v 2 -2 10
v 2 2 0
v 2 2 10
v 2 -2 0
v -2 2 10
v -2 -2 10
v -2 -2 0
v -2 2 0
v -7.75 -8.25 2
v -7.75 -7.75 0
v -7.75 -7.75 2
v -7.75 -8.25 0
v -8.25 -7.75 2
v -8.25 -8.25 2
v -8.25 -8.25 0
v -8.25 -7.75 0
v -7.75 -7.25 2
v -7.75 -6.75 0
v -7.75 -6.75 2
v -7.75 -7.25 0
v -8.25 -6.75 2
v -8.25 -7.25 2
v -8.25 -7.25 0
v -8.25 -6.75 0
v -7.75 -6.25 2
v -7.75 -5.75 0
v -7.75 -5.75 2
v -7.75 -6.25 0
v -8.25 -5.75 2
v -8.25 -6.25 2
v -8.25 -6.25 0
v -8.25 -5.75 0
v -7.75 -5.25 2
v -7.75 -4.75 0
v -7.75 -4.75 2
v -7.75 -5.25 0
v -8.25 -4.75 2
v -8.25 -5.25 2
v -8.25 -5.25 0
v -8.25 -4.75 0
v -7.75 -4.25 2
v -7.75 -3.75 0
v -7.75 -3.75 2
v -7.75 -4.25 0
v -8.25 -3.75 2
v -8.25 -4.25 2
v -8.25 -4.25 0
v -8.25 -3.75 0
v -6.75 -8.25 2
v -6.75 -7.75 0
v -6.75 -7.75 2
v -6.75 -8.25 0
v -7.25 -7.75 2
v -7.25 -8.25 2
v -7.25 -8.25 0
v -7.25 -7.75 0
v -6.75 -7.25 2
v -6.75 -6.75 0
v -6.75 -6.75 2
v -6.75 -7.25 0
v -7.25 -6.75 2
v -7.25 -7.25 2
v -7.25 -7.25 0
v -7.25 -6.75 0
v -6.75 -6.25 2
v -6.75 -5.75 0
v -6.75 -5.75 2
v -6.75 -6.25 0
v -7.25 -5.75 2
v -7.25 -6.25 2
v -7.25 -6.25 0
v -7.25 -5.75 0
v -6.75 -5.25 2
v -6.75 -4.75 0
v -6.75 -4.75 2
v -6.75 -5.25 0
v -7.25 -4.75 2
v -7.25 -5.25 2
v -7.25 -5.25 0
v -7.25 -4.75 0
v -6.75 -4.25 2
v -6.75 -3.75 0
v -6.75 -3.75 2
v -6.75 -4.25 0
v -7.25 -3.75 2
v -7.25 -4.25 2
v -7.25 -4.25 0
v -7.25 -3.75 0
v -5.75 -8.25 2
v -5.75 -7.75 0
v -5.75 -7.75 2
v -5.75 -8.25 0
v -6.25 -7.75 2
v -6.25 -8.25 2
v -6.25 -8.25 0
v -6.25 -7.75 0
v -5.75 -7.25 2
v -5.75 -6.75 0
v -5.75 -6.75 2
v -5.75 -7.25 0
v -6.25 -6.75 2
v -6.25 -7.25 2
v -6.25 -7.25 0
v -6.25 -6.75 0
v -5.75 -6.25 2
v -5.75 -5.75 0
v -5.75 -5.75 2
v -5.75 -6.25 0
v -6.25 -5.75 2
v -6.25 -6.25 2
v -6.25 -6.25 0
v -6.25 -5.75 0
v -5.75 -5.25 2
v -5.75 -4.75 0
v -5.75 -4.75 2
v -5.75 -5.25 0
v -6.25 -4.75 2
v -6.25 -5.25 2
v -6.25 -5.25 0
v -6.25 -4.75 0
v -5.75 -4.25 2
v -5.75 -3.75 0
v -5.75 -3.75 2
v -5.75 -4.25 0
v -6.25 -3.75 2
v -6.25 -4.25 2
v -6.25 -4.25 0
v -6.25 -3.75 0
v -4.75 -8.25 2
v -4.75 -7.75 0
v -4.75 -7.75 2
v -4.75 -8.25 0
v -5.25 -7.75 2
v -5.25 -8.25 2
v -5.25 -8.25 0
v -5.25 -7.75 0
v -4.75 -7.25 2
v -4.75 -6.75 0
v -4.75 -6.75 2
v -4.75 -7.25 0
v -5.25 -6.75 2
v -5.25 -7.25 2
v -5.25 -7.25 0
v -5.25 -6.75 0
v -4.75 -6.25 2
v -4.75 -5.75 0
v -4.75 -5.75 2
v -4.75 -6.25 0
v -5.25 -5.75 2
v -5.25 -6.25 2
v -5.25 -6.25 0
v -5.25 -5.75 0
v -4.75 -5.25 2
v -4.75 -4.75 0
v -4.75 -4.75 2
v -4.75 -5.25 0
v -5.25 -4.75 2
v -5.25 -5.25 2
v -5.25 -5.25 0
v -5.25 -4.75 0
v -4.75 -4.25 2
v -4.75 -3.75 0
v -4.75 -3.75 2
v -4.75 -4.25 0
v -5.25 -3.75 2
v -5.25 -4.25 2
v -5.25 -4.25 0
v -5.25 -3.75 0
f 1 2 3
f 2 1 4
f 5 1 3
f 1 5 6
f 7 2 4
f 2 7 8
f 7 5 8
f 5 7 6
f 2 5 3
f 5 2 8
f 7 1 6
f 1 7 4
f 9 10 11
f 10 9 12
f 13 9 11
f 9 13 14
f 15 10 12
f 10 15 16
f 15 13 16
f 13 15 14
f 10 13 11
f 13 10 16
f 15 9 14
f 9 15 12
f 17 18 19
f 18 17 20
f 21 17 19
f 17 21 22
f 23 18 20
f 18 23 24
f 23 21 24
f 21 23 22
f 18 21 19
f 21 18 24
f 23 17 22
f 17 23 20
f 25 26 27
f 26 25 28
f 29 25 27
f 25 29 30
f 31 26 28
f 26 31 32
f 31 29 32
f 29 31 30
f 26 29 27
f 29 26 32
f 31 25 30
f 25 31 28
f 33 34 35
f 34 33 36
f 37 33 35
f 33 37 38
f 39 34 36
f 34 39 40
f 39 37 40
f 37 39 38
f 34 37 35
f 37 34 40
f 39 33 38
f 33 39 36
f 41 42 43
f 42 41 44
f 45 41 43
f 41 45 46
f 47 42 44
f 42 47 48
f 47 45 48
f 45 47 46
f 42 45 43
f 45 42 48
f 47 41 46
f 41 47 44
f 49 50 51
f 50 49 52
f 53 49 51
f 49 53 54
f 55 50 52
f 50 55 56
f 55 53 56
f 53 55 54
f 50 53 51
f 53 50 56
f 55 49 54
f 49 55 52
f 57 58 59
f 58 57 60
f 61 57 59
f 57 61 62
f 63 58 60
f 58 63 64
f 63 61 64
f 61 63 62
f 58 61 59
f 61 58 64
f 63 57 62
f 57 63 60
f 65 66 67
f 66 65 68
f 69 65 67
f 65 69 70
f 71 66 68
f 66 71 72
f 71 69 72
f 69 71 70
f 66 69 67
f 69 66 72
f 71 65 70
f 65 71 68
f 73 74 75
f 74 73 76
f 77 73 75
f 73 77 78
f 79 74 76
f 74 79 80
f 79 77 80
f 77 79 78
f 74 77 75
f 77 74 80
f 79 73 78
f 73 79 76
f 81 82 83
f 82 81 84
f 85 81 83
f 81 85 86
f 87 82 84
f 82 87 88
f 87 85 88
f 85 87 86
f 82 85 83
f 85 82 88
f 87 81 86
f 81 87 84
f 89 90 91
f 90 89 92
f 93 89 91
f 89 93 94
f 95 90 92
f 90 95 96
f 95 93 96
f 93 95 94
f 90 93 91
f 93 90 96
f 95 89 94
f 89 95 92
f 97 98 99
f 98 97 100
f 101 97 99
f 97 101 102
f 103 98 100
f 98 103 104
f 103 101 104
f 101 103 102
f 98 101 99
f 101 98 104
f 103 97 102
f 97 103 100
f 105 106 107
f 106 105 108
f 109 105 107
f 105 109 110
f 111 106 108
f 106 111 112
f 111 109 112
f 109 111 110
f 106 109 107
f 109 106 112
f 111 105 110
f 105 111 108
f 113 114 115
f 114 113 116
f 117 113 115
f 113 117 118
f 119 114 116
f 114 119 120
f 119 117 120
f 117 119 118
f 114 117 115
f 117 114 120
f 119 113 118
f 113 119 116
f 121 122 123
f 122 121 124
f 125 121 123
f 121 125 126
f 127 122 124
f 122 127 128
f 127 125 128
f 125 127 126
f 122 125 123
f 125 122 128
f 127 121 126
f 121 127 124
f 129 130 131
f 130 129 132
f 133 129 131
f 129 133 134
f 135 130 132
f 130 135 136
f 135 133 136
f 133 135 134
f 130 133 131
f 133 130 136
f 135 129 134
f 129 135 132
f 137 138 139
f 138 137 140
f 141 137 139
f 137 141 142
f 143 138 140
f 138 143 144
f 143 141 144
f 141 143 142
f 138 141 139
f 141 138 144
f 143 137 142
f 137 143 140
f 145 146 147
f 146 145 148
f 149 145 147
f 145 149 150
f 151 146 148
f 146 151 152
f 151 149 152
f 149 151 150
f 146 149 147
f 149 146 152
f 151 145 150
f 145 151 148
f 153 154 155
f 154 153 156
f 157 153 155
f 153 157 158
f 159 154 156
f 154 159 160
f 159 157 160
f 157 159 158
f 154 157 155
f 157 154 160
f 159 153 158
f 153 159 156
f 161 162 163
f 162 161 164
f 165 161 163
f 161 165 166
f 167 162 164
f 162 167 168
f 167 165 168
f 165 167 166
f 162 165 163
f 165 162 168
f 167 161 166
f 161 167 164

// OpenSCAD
translate([0, 0, 5]) color([0,1,0,0.9]) cube([4, 4, 10], center=true);
translate([-8.0, -8.0, 1]) color([1,0,0]) cube([0.5, 0.5, 2], center=true);
translate([-8.0, -7.0, 1]) color([1,0,0]) cube([0.5, 0.5, 2], center=true);
translate([-8.0, -6.0, 1]) color([1,0,0]) cube([0.5, 0.5, 2], center=true);
translate([-8.0, -5.0, 1]) color([1,0,0]) cube([0.5, 0.5, 2], center=true);
translate([-8.0, -4.0, 1]) color([1,0,0]) cube([0.5, 0.5, 2], center=true);
translate([-7.0, -8.0, 1]) color([1,0,0]) cube([0.5, 0.5, 2], center=true);
translate([-7.0, -7.0, 1]) color([1,0,0]) cube([0.5, 0.5, 2], center=true);
translate([-7.0, -6.0, 1]) color([1,0,0]) cube([0.5, 0.5, 2], center=true);
translate([-7.0, -5.0, 1]) color([1,0,0]) cube([0.5, 0.5, 2], center=true);
translate([-7.0, -4.0, 1]) color([1,0,0]) cube([0.5, 0.5, 2], center=true);
translate([-6.0, -8.0, 1]) color([1,0,0]) cube([0.5, 0.5, 2], center=true);
translate([-6.0, -7.0, 1]) color([1,0,0]) cube([0.5, 0.5, 2], center=true);
translate([-6.0, -6.0, 1]) color([1,0,0]) cube([0.5, 0.5, 2], center=true);
translate([-6.0, -5.0, 1]) color([1,0,0]) cube([0.5, 0.5, 2], center=true);
translate([-6.0, -4.0, 1]) color([1,0,0]) cube([0.5, 0.5, 2], center=true);
translate([-5.0, -8.0, 1]) color([1,0,0]) cube([0.5, 0.5, 2], center=true);
translate([-5.0, -7.0, 1]) color([1,0,0]) cube([0.5, 0.5, 2], center=true);
translate([-5.0, -6.0, 1]) color([1,0,0]) cube([0.5, 0.5, 2], center=true);
translate([-5.0, -5.0, 1]) color([1,0,0]) cube([0.5, 0.5, 2], center=true);
translate([-5.0, -4.0, 1]) color([1,0,0]) cube([0.5, 0.5, 2], center=true);
